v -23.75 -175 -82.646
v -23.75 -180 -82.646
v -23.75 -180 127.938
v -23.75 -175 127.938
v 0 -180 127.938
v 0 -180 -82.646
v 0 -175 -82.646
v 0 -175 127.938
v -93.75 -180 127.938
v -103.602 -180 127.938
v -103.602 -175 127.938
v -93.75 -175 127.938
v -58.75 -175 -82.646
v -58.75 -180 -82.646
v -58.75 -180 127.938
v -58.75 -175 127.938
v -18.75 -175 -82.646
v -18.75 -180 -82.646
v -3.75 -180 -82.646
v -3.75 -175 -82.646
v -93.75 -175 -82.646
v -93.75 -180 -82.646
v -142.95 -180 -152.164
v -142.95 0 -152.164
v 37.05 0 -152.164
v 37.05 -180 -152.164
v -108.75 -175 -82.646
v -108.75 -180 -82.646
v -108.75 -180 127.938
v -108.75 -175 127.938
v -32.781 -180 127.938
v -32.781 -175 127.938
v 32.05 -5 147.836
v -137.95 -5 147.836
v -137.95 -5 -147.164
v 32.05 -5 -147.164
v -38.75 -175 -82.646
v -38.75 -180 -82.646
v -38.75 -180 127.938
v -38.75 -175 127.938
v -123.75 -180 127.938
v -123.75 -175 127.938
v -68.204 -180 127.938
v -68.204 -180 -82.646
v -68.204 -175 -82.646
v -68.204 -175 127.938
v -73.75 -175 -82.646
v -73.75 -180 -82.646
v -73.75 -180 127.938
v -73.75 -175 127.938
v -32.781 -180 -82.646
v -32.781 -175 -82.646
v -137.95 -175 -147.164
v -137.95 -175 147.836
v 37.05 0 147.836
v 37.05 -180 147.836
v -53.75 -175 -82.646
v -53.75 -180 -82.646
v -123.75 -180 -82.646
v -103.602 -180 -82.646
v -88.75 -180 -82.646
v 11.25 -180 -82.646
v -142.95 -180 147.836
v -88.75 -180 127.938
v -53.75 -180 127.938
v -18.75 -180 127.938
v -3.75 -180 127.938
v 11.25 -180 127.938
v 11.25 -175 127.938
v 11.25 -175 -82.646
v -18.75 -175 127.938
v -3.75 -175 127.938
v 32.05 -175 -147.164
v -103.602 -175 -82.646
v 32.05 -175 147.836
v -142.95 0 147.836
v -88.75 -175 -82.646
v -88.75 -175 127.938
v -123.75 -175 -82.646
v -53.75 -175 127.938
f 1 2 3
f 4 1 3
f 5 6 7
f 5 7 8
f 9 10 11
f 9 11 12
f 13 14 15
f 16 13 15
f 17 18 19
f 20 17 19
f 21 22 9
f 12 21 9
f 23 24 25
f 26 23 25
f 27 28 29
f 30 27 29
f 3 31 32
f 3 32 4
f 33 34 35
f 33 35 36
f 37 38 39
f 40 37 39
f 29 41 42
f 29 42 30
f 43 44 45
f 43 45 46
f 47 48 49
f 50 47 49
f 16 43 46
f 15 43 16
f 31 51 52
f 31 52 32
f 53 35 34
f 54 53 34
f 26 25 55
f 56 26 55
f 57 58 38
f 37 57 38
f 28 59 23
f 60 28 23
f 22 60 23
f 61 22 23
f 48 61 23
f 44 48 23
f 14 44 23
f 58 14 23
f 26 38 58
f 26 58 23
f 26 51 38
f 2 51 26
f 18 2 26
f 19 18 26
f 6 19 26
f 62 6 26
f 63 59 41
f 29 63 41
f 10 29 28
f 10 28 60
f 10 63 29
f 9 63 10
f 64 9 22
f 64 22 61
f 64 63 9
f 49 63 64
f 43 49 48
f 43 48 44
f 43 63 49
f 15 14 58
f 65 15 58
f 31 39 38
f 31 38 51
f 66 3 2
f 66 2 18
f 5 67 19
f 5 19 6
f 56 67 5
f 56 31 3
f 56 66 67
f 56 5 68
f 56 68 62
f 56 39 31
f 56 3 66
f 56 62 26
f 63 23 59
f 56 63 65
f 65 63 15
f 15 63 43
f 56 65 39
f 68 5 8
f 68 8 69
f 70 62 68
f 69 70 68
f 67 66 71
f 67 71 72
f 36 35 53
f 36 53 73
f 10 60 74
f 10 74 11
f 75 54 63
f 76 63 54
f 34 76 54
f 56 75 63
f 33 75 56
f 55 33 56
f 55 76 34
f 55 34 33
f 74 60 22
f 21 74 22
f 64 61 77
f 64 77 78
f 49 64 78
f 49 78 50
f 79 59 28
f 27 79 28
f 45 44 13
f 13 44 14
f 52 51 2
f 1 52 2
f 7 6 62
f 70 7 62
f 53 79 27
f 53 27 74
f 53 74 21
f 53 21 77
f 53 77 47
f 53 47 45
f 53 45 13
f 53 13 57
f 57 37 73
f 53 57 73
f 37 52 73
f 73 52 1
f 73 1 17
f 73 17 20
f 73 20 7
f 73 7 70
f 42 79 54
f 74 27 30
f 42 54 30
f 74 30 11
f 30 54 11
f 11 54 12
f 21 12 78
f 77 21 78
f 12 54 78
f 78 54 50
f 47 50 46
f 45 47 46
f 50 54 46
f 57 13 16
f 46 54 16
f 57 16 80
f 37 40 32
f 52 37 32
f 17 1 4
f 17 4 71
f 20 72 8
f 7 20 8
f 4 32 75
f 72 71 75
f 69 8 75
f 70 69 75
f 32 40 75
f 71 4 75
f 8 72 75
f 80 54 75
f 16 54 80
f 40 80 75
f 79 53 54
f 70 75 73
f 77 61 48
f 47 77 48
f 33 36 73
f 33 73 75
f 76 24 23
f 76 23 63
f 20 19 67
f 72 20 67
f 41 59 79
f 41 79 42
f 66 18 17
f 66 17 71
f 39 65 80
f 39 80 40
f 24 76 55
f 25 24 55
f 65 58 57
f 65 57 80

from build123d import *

# Parameters (mm, degrees)
F0_W     = 180
F0_H     = 300
F1_DEPTH = 180
F2_T     = -5
F3_W     = 15
F3_H     = 210.58443
F3_W_2   = 9.852498
F3_W_3   = 9.454142
F3_W_4   = 9.030989
F3_W_5   = 11.25
F4_DEPTH = 25


with BuildPart() as f1:
    # F0 (on Front) → F1 (new body)
    with BuildSketch(Plane.XZ):
        with Locations((-52.950007, -2.163574)):
            Rectangle(F0_W, F0_H)
    extrude(amount=F1_DEPTH)

    # F2
    f2_openings = [f1.faces().sort_by_distance(p)[0] for p in [
        (-52.950007, -90, 147.836426),
    ]]
    offset(amount=F2_T, openings=f2_openings)

    # F3 (on face) → F4 (cut)
    with BuildSketch(Plane.XZ.offset(180)):
        with Locations((-116.25, 22.645805)):
            Rectangle(F3_W, F3_H)
        with Locations((-98.676249, 22.645805)):
            Rectangle(F3_W_2, F3_H)
        with Locations((-81.25, 22.645805)):
            Rectangle(F3_W, F3_H)
        with Locations((-63.477071, 22.645805)):
            Rectangle(F3_W_3, F3_H)
        with Locations((-46.25, 22.645808)):
            Rectangle(F3_W, F3_H)
        with Locations((-28.265494, 22.645808)):
            Rectangle(F3_W_4, F3_H)
        with Locations((-11.25, 22.645808)):
            Rectangle(F3_W, F3_H)
        with Locations((5.625, 22.645808)):
            Rectangle(F3_W_5, F3_H)
    extrude(amount=-F4_DEPTH, mode=Mode.SUBTRACT)


solid = f1.part
